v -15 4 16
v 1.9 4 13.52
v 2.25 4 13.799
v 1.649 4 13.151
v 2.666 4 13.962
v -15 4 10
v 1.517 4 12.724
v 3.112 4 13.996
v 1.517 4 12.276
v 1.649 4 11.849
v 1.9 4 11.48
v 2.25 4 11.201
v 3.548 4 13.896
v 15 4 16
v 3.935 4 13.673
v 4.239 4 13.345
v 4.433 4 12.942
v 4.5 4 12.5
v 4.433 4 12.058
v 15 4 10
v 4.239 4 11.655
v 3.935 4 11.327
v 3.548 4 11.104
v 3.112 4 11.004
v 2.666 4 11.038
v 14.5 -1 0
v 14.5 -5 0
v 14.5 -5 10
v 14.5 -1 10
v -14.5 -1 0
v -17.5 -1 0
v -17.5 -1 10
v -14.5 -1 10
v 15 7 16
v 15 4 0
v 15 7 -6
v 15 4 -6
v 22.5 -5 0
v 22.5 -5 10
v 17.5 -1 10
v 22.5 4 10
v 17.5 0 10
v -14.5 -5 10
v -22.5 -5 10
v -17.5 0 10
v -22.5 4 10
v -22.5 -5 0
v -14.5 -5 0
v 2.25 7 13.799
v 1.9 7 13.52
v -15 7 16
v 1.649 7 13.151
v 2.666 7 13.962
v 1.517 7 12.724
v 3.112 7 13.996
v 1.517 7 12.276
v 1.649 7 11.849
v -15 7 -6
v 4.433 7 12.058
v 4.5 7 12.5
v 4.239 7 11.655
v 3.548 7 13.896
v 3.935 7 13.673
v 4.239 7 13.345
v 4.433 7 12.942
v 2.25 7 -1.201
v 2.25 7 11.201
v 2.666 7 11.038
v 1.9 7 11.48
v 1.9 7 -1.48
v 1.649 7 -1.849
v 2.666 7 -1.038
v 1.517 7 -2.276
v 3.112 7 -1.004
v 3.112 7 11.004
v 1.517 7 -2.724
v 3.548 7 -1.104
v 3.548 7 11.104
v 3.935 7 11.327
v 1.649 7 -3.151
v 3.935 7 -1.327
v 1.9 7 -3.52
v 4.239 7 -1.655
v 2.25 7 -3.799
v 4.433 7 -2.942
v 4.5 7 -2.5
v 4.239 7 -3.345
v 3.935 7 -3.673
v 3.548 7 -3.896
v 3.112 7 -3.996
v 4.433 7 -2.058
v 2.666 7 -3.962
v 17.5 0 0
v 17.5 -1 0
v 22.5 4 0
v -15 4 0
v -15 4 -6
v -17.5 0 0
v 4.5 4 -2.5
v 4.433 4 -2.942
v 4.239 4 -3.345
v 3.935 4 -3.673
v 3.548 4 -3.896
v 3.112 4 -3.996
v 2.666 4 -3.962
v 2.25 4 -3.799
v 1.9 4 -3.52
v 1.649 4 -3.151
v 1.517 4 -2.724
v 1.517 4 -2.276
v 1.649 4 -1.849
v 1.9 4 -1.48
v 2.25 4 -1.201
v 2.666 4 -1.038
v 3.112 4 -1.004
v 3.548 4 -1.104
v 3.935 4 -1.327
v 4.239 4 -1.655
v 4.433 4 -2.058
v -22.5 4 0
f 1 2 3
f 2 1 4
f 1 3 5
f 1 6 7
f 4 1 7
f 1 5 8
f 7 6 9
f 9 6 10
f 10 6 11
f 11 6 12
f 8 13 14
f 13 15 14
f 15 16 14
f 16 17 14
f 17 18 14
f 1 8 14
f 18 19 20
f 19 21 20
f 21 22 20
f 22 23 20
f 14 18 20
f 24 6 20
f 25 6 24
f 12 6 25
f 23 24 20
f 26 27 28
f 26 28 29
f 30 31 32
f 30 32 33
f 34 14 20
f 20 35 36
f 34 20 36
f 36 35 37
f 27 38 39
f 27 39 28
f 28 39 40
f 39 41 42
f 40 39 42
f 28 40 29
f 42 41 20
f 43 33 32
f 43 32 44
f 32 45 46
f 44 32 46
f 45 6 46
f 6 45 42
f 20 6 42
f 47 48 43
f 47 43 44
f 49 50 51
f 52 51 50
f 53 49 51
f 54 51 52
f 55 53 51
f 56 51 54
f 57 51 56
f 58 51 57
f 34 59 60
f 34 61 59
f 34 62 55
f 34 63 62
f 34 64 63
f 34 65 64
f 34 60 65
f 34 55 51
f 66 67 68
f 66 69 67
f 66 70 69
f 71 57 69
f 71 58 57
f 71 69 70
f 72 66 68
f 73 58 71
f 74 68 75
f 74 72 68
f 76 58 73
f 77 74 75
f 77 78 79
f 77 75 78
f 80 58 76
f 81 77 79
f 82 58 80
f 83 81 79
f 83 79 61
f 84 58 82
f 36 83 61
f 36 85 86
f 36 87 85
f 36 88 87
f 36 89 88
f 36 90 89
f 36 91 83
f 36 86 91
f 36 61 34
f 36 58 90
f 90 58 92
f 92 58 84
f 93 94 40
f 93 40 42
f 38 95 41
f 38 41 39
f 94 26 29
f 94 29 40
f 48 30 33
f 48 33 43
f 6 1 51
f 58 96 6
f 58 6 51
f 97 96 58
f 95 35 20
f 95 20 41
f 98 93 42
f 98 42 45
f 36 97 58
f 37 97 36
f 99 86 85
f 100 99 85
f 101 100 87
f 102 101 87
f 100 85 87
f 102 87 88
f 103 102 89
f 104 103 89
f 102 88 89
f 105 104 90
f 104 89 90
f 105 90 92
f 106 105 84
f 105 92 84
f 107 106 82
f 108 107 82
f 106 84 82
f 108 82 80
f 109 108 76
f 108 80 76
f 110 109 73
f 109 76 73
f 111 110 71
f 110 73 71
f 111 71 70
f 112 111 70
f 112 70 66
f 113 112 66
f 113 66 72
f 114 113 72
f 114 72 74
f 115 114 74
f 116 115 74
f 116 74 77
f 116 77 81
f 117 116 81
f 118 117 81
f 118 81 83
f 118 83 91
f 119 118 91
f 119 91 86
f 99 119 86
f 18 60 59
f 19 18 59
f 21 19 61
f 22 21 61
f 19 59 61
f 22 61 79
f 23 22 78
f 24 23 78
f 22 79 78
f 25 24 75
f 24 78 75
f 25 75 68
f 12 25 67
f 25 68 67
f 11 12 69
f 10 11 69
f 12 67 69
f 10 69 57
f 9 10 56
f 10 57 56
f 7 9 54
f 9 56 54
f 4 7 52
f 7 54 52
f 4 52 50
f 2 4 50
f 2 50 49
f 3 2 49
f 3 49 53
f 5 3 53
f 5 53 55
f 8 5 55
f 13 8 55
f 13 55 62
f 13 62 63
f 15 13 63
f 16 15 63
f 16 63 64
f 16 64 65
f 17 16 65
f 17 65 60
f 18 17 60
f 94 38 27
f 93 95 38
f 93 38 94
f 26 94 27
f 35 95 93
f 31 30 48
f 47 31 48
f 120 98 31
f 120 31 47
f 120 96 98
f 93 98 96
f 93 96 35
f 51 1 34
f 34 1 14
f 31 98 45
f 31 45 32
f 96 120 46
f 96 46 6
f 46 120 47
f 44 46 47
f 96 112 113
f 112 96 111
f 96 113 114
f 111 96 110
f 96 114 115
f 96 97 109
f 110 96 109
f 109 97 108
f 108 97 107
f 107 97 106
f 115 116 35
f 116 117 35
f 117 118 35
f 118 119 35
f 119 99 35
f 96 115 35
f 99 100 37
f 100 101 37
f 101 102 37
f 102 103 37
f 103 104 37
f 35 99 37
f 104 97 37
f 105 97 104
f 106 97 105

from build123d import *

# Parameters (mm, degrees)
BOSS_EXTRUDE1_DEPTH = 10
SKETCH3_W           = 30
SKETCH3_H           = 22
BOSS_EXTRUDE2_DEPTH = 3
SKETCH4_R           = 1.5
CUT_EXTRUDE1_DEPTH  = 5


with BuildPart() as part:
    # Sketch2 → Boss-Extrude1 (new body)
    with BuildSketch(Plane.XY):
        Polygon((-17.5, 0), (-17.5, -1), (-14.5, -1), (-14.5, -5), (-22.5, -5), (-22.5, 0), (-22.5, 4), (22.5, 4), (22.5, -5), (14.5, -5), (14.5, -1), (17.5, -1), (17.5, 0), align=None)
    extrude(amount=BOSS_EXTRUDE1_DEPTH)

    # Sketch3 → Boss-Extrude2 (add)
    with BuildSketch(Plane(origin=(0, 4, 0), x_dir=(1, 0, 0), z_dir=(0, 1, 0))):
        with Locations((0, -5)):
            Rectangle(SKETCH3_W, SKETCH3_H)
    extrude(amount=BOSS_EXTRUDE2_DEPTH)

    # Sketch4 → Cut-Extrude1 (cut)
    with BuildSketch(Plane(origin=(0, 7, 0), x_dir=(1, 0, 0), z_dir=(0, 1, 0))):
        with Locations((3, 2.5)):
            Circle(SKETCH4_R)
        with Locations((3, -12.5)):
            Circle(SKETCH4_R)
    extrude(amount=-CUT_EXTRUDE1_DEPTH, mode=Mode.SUBTRACT)


solid = part.part
